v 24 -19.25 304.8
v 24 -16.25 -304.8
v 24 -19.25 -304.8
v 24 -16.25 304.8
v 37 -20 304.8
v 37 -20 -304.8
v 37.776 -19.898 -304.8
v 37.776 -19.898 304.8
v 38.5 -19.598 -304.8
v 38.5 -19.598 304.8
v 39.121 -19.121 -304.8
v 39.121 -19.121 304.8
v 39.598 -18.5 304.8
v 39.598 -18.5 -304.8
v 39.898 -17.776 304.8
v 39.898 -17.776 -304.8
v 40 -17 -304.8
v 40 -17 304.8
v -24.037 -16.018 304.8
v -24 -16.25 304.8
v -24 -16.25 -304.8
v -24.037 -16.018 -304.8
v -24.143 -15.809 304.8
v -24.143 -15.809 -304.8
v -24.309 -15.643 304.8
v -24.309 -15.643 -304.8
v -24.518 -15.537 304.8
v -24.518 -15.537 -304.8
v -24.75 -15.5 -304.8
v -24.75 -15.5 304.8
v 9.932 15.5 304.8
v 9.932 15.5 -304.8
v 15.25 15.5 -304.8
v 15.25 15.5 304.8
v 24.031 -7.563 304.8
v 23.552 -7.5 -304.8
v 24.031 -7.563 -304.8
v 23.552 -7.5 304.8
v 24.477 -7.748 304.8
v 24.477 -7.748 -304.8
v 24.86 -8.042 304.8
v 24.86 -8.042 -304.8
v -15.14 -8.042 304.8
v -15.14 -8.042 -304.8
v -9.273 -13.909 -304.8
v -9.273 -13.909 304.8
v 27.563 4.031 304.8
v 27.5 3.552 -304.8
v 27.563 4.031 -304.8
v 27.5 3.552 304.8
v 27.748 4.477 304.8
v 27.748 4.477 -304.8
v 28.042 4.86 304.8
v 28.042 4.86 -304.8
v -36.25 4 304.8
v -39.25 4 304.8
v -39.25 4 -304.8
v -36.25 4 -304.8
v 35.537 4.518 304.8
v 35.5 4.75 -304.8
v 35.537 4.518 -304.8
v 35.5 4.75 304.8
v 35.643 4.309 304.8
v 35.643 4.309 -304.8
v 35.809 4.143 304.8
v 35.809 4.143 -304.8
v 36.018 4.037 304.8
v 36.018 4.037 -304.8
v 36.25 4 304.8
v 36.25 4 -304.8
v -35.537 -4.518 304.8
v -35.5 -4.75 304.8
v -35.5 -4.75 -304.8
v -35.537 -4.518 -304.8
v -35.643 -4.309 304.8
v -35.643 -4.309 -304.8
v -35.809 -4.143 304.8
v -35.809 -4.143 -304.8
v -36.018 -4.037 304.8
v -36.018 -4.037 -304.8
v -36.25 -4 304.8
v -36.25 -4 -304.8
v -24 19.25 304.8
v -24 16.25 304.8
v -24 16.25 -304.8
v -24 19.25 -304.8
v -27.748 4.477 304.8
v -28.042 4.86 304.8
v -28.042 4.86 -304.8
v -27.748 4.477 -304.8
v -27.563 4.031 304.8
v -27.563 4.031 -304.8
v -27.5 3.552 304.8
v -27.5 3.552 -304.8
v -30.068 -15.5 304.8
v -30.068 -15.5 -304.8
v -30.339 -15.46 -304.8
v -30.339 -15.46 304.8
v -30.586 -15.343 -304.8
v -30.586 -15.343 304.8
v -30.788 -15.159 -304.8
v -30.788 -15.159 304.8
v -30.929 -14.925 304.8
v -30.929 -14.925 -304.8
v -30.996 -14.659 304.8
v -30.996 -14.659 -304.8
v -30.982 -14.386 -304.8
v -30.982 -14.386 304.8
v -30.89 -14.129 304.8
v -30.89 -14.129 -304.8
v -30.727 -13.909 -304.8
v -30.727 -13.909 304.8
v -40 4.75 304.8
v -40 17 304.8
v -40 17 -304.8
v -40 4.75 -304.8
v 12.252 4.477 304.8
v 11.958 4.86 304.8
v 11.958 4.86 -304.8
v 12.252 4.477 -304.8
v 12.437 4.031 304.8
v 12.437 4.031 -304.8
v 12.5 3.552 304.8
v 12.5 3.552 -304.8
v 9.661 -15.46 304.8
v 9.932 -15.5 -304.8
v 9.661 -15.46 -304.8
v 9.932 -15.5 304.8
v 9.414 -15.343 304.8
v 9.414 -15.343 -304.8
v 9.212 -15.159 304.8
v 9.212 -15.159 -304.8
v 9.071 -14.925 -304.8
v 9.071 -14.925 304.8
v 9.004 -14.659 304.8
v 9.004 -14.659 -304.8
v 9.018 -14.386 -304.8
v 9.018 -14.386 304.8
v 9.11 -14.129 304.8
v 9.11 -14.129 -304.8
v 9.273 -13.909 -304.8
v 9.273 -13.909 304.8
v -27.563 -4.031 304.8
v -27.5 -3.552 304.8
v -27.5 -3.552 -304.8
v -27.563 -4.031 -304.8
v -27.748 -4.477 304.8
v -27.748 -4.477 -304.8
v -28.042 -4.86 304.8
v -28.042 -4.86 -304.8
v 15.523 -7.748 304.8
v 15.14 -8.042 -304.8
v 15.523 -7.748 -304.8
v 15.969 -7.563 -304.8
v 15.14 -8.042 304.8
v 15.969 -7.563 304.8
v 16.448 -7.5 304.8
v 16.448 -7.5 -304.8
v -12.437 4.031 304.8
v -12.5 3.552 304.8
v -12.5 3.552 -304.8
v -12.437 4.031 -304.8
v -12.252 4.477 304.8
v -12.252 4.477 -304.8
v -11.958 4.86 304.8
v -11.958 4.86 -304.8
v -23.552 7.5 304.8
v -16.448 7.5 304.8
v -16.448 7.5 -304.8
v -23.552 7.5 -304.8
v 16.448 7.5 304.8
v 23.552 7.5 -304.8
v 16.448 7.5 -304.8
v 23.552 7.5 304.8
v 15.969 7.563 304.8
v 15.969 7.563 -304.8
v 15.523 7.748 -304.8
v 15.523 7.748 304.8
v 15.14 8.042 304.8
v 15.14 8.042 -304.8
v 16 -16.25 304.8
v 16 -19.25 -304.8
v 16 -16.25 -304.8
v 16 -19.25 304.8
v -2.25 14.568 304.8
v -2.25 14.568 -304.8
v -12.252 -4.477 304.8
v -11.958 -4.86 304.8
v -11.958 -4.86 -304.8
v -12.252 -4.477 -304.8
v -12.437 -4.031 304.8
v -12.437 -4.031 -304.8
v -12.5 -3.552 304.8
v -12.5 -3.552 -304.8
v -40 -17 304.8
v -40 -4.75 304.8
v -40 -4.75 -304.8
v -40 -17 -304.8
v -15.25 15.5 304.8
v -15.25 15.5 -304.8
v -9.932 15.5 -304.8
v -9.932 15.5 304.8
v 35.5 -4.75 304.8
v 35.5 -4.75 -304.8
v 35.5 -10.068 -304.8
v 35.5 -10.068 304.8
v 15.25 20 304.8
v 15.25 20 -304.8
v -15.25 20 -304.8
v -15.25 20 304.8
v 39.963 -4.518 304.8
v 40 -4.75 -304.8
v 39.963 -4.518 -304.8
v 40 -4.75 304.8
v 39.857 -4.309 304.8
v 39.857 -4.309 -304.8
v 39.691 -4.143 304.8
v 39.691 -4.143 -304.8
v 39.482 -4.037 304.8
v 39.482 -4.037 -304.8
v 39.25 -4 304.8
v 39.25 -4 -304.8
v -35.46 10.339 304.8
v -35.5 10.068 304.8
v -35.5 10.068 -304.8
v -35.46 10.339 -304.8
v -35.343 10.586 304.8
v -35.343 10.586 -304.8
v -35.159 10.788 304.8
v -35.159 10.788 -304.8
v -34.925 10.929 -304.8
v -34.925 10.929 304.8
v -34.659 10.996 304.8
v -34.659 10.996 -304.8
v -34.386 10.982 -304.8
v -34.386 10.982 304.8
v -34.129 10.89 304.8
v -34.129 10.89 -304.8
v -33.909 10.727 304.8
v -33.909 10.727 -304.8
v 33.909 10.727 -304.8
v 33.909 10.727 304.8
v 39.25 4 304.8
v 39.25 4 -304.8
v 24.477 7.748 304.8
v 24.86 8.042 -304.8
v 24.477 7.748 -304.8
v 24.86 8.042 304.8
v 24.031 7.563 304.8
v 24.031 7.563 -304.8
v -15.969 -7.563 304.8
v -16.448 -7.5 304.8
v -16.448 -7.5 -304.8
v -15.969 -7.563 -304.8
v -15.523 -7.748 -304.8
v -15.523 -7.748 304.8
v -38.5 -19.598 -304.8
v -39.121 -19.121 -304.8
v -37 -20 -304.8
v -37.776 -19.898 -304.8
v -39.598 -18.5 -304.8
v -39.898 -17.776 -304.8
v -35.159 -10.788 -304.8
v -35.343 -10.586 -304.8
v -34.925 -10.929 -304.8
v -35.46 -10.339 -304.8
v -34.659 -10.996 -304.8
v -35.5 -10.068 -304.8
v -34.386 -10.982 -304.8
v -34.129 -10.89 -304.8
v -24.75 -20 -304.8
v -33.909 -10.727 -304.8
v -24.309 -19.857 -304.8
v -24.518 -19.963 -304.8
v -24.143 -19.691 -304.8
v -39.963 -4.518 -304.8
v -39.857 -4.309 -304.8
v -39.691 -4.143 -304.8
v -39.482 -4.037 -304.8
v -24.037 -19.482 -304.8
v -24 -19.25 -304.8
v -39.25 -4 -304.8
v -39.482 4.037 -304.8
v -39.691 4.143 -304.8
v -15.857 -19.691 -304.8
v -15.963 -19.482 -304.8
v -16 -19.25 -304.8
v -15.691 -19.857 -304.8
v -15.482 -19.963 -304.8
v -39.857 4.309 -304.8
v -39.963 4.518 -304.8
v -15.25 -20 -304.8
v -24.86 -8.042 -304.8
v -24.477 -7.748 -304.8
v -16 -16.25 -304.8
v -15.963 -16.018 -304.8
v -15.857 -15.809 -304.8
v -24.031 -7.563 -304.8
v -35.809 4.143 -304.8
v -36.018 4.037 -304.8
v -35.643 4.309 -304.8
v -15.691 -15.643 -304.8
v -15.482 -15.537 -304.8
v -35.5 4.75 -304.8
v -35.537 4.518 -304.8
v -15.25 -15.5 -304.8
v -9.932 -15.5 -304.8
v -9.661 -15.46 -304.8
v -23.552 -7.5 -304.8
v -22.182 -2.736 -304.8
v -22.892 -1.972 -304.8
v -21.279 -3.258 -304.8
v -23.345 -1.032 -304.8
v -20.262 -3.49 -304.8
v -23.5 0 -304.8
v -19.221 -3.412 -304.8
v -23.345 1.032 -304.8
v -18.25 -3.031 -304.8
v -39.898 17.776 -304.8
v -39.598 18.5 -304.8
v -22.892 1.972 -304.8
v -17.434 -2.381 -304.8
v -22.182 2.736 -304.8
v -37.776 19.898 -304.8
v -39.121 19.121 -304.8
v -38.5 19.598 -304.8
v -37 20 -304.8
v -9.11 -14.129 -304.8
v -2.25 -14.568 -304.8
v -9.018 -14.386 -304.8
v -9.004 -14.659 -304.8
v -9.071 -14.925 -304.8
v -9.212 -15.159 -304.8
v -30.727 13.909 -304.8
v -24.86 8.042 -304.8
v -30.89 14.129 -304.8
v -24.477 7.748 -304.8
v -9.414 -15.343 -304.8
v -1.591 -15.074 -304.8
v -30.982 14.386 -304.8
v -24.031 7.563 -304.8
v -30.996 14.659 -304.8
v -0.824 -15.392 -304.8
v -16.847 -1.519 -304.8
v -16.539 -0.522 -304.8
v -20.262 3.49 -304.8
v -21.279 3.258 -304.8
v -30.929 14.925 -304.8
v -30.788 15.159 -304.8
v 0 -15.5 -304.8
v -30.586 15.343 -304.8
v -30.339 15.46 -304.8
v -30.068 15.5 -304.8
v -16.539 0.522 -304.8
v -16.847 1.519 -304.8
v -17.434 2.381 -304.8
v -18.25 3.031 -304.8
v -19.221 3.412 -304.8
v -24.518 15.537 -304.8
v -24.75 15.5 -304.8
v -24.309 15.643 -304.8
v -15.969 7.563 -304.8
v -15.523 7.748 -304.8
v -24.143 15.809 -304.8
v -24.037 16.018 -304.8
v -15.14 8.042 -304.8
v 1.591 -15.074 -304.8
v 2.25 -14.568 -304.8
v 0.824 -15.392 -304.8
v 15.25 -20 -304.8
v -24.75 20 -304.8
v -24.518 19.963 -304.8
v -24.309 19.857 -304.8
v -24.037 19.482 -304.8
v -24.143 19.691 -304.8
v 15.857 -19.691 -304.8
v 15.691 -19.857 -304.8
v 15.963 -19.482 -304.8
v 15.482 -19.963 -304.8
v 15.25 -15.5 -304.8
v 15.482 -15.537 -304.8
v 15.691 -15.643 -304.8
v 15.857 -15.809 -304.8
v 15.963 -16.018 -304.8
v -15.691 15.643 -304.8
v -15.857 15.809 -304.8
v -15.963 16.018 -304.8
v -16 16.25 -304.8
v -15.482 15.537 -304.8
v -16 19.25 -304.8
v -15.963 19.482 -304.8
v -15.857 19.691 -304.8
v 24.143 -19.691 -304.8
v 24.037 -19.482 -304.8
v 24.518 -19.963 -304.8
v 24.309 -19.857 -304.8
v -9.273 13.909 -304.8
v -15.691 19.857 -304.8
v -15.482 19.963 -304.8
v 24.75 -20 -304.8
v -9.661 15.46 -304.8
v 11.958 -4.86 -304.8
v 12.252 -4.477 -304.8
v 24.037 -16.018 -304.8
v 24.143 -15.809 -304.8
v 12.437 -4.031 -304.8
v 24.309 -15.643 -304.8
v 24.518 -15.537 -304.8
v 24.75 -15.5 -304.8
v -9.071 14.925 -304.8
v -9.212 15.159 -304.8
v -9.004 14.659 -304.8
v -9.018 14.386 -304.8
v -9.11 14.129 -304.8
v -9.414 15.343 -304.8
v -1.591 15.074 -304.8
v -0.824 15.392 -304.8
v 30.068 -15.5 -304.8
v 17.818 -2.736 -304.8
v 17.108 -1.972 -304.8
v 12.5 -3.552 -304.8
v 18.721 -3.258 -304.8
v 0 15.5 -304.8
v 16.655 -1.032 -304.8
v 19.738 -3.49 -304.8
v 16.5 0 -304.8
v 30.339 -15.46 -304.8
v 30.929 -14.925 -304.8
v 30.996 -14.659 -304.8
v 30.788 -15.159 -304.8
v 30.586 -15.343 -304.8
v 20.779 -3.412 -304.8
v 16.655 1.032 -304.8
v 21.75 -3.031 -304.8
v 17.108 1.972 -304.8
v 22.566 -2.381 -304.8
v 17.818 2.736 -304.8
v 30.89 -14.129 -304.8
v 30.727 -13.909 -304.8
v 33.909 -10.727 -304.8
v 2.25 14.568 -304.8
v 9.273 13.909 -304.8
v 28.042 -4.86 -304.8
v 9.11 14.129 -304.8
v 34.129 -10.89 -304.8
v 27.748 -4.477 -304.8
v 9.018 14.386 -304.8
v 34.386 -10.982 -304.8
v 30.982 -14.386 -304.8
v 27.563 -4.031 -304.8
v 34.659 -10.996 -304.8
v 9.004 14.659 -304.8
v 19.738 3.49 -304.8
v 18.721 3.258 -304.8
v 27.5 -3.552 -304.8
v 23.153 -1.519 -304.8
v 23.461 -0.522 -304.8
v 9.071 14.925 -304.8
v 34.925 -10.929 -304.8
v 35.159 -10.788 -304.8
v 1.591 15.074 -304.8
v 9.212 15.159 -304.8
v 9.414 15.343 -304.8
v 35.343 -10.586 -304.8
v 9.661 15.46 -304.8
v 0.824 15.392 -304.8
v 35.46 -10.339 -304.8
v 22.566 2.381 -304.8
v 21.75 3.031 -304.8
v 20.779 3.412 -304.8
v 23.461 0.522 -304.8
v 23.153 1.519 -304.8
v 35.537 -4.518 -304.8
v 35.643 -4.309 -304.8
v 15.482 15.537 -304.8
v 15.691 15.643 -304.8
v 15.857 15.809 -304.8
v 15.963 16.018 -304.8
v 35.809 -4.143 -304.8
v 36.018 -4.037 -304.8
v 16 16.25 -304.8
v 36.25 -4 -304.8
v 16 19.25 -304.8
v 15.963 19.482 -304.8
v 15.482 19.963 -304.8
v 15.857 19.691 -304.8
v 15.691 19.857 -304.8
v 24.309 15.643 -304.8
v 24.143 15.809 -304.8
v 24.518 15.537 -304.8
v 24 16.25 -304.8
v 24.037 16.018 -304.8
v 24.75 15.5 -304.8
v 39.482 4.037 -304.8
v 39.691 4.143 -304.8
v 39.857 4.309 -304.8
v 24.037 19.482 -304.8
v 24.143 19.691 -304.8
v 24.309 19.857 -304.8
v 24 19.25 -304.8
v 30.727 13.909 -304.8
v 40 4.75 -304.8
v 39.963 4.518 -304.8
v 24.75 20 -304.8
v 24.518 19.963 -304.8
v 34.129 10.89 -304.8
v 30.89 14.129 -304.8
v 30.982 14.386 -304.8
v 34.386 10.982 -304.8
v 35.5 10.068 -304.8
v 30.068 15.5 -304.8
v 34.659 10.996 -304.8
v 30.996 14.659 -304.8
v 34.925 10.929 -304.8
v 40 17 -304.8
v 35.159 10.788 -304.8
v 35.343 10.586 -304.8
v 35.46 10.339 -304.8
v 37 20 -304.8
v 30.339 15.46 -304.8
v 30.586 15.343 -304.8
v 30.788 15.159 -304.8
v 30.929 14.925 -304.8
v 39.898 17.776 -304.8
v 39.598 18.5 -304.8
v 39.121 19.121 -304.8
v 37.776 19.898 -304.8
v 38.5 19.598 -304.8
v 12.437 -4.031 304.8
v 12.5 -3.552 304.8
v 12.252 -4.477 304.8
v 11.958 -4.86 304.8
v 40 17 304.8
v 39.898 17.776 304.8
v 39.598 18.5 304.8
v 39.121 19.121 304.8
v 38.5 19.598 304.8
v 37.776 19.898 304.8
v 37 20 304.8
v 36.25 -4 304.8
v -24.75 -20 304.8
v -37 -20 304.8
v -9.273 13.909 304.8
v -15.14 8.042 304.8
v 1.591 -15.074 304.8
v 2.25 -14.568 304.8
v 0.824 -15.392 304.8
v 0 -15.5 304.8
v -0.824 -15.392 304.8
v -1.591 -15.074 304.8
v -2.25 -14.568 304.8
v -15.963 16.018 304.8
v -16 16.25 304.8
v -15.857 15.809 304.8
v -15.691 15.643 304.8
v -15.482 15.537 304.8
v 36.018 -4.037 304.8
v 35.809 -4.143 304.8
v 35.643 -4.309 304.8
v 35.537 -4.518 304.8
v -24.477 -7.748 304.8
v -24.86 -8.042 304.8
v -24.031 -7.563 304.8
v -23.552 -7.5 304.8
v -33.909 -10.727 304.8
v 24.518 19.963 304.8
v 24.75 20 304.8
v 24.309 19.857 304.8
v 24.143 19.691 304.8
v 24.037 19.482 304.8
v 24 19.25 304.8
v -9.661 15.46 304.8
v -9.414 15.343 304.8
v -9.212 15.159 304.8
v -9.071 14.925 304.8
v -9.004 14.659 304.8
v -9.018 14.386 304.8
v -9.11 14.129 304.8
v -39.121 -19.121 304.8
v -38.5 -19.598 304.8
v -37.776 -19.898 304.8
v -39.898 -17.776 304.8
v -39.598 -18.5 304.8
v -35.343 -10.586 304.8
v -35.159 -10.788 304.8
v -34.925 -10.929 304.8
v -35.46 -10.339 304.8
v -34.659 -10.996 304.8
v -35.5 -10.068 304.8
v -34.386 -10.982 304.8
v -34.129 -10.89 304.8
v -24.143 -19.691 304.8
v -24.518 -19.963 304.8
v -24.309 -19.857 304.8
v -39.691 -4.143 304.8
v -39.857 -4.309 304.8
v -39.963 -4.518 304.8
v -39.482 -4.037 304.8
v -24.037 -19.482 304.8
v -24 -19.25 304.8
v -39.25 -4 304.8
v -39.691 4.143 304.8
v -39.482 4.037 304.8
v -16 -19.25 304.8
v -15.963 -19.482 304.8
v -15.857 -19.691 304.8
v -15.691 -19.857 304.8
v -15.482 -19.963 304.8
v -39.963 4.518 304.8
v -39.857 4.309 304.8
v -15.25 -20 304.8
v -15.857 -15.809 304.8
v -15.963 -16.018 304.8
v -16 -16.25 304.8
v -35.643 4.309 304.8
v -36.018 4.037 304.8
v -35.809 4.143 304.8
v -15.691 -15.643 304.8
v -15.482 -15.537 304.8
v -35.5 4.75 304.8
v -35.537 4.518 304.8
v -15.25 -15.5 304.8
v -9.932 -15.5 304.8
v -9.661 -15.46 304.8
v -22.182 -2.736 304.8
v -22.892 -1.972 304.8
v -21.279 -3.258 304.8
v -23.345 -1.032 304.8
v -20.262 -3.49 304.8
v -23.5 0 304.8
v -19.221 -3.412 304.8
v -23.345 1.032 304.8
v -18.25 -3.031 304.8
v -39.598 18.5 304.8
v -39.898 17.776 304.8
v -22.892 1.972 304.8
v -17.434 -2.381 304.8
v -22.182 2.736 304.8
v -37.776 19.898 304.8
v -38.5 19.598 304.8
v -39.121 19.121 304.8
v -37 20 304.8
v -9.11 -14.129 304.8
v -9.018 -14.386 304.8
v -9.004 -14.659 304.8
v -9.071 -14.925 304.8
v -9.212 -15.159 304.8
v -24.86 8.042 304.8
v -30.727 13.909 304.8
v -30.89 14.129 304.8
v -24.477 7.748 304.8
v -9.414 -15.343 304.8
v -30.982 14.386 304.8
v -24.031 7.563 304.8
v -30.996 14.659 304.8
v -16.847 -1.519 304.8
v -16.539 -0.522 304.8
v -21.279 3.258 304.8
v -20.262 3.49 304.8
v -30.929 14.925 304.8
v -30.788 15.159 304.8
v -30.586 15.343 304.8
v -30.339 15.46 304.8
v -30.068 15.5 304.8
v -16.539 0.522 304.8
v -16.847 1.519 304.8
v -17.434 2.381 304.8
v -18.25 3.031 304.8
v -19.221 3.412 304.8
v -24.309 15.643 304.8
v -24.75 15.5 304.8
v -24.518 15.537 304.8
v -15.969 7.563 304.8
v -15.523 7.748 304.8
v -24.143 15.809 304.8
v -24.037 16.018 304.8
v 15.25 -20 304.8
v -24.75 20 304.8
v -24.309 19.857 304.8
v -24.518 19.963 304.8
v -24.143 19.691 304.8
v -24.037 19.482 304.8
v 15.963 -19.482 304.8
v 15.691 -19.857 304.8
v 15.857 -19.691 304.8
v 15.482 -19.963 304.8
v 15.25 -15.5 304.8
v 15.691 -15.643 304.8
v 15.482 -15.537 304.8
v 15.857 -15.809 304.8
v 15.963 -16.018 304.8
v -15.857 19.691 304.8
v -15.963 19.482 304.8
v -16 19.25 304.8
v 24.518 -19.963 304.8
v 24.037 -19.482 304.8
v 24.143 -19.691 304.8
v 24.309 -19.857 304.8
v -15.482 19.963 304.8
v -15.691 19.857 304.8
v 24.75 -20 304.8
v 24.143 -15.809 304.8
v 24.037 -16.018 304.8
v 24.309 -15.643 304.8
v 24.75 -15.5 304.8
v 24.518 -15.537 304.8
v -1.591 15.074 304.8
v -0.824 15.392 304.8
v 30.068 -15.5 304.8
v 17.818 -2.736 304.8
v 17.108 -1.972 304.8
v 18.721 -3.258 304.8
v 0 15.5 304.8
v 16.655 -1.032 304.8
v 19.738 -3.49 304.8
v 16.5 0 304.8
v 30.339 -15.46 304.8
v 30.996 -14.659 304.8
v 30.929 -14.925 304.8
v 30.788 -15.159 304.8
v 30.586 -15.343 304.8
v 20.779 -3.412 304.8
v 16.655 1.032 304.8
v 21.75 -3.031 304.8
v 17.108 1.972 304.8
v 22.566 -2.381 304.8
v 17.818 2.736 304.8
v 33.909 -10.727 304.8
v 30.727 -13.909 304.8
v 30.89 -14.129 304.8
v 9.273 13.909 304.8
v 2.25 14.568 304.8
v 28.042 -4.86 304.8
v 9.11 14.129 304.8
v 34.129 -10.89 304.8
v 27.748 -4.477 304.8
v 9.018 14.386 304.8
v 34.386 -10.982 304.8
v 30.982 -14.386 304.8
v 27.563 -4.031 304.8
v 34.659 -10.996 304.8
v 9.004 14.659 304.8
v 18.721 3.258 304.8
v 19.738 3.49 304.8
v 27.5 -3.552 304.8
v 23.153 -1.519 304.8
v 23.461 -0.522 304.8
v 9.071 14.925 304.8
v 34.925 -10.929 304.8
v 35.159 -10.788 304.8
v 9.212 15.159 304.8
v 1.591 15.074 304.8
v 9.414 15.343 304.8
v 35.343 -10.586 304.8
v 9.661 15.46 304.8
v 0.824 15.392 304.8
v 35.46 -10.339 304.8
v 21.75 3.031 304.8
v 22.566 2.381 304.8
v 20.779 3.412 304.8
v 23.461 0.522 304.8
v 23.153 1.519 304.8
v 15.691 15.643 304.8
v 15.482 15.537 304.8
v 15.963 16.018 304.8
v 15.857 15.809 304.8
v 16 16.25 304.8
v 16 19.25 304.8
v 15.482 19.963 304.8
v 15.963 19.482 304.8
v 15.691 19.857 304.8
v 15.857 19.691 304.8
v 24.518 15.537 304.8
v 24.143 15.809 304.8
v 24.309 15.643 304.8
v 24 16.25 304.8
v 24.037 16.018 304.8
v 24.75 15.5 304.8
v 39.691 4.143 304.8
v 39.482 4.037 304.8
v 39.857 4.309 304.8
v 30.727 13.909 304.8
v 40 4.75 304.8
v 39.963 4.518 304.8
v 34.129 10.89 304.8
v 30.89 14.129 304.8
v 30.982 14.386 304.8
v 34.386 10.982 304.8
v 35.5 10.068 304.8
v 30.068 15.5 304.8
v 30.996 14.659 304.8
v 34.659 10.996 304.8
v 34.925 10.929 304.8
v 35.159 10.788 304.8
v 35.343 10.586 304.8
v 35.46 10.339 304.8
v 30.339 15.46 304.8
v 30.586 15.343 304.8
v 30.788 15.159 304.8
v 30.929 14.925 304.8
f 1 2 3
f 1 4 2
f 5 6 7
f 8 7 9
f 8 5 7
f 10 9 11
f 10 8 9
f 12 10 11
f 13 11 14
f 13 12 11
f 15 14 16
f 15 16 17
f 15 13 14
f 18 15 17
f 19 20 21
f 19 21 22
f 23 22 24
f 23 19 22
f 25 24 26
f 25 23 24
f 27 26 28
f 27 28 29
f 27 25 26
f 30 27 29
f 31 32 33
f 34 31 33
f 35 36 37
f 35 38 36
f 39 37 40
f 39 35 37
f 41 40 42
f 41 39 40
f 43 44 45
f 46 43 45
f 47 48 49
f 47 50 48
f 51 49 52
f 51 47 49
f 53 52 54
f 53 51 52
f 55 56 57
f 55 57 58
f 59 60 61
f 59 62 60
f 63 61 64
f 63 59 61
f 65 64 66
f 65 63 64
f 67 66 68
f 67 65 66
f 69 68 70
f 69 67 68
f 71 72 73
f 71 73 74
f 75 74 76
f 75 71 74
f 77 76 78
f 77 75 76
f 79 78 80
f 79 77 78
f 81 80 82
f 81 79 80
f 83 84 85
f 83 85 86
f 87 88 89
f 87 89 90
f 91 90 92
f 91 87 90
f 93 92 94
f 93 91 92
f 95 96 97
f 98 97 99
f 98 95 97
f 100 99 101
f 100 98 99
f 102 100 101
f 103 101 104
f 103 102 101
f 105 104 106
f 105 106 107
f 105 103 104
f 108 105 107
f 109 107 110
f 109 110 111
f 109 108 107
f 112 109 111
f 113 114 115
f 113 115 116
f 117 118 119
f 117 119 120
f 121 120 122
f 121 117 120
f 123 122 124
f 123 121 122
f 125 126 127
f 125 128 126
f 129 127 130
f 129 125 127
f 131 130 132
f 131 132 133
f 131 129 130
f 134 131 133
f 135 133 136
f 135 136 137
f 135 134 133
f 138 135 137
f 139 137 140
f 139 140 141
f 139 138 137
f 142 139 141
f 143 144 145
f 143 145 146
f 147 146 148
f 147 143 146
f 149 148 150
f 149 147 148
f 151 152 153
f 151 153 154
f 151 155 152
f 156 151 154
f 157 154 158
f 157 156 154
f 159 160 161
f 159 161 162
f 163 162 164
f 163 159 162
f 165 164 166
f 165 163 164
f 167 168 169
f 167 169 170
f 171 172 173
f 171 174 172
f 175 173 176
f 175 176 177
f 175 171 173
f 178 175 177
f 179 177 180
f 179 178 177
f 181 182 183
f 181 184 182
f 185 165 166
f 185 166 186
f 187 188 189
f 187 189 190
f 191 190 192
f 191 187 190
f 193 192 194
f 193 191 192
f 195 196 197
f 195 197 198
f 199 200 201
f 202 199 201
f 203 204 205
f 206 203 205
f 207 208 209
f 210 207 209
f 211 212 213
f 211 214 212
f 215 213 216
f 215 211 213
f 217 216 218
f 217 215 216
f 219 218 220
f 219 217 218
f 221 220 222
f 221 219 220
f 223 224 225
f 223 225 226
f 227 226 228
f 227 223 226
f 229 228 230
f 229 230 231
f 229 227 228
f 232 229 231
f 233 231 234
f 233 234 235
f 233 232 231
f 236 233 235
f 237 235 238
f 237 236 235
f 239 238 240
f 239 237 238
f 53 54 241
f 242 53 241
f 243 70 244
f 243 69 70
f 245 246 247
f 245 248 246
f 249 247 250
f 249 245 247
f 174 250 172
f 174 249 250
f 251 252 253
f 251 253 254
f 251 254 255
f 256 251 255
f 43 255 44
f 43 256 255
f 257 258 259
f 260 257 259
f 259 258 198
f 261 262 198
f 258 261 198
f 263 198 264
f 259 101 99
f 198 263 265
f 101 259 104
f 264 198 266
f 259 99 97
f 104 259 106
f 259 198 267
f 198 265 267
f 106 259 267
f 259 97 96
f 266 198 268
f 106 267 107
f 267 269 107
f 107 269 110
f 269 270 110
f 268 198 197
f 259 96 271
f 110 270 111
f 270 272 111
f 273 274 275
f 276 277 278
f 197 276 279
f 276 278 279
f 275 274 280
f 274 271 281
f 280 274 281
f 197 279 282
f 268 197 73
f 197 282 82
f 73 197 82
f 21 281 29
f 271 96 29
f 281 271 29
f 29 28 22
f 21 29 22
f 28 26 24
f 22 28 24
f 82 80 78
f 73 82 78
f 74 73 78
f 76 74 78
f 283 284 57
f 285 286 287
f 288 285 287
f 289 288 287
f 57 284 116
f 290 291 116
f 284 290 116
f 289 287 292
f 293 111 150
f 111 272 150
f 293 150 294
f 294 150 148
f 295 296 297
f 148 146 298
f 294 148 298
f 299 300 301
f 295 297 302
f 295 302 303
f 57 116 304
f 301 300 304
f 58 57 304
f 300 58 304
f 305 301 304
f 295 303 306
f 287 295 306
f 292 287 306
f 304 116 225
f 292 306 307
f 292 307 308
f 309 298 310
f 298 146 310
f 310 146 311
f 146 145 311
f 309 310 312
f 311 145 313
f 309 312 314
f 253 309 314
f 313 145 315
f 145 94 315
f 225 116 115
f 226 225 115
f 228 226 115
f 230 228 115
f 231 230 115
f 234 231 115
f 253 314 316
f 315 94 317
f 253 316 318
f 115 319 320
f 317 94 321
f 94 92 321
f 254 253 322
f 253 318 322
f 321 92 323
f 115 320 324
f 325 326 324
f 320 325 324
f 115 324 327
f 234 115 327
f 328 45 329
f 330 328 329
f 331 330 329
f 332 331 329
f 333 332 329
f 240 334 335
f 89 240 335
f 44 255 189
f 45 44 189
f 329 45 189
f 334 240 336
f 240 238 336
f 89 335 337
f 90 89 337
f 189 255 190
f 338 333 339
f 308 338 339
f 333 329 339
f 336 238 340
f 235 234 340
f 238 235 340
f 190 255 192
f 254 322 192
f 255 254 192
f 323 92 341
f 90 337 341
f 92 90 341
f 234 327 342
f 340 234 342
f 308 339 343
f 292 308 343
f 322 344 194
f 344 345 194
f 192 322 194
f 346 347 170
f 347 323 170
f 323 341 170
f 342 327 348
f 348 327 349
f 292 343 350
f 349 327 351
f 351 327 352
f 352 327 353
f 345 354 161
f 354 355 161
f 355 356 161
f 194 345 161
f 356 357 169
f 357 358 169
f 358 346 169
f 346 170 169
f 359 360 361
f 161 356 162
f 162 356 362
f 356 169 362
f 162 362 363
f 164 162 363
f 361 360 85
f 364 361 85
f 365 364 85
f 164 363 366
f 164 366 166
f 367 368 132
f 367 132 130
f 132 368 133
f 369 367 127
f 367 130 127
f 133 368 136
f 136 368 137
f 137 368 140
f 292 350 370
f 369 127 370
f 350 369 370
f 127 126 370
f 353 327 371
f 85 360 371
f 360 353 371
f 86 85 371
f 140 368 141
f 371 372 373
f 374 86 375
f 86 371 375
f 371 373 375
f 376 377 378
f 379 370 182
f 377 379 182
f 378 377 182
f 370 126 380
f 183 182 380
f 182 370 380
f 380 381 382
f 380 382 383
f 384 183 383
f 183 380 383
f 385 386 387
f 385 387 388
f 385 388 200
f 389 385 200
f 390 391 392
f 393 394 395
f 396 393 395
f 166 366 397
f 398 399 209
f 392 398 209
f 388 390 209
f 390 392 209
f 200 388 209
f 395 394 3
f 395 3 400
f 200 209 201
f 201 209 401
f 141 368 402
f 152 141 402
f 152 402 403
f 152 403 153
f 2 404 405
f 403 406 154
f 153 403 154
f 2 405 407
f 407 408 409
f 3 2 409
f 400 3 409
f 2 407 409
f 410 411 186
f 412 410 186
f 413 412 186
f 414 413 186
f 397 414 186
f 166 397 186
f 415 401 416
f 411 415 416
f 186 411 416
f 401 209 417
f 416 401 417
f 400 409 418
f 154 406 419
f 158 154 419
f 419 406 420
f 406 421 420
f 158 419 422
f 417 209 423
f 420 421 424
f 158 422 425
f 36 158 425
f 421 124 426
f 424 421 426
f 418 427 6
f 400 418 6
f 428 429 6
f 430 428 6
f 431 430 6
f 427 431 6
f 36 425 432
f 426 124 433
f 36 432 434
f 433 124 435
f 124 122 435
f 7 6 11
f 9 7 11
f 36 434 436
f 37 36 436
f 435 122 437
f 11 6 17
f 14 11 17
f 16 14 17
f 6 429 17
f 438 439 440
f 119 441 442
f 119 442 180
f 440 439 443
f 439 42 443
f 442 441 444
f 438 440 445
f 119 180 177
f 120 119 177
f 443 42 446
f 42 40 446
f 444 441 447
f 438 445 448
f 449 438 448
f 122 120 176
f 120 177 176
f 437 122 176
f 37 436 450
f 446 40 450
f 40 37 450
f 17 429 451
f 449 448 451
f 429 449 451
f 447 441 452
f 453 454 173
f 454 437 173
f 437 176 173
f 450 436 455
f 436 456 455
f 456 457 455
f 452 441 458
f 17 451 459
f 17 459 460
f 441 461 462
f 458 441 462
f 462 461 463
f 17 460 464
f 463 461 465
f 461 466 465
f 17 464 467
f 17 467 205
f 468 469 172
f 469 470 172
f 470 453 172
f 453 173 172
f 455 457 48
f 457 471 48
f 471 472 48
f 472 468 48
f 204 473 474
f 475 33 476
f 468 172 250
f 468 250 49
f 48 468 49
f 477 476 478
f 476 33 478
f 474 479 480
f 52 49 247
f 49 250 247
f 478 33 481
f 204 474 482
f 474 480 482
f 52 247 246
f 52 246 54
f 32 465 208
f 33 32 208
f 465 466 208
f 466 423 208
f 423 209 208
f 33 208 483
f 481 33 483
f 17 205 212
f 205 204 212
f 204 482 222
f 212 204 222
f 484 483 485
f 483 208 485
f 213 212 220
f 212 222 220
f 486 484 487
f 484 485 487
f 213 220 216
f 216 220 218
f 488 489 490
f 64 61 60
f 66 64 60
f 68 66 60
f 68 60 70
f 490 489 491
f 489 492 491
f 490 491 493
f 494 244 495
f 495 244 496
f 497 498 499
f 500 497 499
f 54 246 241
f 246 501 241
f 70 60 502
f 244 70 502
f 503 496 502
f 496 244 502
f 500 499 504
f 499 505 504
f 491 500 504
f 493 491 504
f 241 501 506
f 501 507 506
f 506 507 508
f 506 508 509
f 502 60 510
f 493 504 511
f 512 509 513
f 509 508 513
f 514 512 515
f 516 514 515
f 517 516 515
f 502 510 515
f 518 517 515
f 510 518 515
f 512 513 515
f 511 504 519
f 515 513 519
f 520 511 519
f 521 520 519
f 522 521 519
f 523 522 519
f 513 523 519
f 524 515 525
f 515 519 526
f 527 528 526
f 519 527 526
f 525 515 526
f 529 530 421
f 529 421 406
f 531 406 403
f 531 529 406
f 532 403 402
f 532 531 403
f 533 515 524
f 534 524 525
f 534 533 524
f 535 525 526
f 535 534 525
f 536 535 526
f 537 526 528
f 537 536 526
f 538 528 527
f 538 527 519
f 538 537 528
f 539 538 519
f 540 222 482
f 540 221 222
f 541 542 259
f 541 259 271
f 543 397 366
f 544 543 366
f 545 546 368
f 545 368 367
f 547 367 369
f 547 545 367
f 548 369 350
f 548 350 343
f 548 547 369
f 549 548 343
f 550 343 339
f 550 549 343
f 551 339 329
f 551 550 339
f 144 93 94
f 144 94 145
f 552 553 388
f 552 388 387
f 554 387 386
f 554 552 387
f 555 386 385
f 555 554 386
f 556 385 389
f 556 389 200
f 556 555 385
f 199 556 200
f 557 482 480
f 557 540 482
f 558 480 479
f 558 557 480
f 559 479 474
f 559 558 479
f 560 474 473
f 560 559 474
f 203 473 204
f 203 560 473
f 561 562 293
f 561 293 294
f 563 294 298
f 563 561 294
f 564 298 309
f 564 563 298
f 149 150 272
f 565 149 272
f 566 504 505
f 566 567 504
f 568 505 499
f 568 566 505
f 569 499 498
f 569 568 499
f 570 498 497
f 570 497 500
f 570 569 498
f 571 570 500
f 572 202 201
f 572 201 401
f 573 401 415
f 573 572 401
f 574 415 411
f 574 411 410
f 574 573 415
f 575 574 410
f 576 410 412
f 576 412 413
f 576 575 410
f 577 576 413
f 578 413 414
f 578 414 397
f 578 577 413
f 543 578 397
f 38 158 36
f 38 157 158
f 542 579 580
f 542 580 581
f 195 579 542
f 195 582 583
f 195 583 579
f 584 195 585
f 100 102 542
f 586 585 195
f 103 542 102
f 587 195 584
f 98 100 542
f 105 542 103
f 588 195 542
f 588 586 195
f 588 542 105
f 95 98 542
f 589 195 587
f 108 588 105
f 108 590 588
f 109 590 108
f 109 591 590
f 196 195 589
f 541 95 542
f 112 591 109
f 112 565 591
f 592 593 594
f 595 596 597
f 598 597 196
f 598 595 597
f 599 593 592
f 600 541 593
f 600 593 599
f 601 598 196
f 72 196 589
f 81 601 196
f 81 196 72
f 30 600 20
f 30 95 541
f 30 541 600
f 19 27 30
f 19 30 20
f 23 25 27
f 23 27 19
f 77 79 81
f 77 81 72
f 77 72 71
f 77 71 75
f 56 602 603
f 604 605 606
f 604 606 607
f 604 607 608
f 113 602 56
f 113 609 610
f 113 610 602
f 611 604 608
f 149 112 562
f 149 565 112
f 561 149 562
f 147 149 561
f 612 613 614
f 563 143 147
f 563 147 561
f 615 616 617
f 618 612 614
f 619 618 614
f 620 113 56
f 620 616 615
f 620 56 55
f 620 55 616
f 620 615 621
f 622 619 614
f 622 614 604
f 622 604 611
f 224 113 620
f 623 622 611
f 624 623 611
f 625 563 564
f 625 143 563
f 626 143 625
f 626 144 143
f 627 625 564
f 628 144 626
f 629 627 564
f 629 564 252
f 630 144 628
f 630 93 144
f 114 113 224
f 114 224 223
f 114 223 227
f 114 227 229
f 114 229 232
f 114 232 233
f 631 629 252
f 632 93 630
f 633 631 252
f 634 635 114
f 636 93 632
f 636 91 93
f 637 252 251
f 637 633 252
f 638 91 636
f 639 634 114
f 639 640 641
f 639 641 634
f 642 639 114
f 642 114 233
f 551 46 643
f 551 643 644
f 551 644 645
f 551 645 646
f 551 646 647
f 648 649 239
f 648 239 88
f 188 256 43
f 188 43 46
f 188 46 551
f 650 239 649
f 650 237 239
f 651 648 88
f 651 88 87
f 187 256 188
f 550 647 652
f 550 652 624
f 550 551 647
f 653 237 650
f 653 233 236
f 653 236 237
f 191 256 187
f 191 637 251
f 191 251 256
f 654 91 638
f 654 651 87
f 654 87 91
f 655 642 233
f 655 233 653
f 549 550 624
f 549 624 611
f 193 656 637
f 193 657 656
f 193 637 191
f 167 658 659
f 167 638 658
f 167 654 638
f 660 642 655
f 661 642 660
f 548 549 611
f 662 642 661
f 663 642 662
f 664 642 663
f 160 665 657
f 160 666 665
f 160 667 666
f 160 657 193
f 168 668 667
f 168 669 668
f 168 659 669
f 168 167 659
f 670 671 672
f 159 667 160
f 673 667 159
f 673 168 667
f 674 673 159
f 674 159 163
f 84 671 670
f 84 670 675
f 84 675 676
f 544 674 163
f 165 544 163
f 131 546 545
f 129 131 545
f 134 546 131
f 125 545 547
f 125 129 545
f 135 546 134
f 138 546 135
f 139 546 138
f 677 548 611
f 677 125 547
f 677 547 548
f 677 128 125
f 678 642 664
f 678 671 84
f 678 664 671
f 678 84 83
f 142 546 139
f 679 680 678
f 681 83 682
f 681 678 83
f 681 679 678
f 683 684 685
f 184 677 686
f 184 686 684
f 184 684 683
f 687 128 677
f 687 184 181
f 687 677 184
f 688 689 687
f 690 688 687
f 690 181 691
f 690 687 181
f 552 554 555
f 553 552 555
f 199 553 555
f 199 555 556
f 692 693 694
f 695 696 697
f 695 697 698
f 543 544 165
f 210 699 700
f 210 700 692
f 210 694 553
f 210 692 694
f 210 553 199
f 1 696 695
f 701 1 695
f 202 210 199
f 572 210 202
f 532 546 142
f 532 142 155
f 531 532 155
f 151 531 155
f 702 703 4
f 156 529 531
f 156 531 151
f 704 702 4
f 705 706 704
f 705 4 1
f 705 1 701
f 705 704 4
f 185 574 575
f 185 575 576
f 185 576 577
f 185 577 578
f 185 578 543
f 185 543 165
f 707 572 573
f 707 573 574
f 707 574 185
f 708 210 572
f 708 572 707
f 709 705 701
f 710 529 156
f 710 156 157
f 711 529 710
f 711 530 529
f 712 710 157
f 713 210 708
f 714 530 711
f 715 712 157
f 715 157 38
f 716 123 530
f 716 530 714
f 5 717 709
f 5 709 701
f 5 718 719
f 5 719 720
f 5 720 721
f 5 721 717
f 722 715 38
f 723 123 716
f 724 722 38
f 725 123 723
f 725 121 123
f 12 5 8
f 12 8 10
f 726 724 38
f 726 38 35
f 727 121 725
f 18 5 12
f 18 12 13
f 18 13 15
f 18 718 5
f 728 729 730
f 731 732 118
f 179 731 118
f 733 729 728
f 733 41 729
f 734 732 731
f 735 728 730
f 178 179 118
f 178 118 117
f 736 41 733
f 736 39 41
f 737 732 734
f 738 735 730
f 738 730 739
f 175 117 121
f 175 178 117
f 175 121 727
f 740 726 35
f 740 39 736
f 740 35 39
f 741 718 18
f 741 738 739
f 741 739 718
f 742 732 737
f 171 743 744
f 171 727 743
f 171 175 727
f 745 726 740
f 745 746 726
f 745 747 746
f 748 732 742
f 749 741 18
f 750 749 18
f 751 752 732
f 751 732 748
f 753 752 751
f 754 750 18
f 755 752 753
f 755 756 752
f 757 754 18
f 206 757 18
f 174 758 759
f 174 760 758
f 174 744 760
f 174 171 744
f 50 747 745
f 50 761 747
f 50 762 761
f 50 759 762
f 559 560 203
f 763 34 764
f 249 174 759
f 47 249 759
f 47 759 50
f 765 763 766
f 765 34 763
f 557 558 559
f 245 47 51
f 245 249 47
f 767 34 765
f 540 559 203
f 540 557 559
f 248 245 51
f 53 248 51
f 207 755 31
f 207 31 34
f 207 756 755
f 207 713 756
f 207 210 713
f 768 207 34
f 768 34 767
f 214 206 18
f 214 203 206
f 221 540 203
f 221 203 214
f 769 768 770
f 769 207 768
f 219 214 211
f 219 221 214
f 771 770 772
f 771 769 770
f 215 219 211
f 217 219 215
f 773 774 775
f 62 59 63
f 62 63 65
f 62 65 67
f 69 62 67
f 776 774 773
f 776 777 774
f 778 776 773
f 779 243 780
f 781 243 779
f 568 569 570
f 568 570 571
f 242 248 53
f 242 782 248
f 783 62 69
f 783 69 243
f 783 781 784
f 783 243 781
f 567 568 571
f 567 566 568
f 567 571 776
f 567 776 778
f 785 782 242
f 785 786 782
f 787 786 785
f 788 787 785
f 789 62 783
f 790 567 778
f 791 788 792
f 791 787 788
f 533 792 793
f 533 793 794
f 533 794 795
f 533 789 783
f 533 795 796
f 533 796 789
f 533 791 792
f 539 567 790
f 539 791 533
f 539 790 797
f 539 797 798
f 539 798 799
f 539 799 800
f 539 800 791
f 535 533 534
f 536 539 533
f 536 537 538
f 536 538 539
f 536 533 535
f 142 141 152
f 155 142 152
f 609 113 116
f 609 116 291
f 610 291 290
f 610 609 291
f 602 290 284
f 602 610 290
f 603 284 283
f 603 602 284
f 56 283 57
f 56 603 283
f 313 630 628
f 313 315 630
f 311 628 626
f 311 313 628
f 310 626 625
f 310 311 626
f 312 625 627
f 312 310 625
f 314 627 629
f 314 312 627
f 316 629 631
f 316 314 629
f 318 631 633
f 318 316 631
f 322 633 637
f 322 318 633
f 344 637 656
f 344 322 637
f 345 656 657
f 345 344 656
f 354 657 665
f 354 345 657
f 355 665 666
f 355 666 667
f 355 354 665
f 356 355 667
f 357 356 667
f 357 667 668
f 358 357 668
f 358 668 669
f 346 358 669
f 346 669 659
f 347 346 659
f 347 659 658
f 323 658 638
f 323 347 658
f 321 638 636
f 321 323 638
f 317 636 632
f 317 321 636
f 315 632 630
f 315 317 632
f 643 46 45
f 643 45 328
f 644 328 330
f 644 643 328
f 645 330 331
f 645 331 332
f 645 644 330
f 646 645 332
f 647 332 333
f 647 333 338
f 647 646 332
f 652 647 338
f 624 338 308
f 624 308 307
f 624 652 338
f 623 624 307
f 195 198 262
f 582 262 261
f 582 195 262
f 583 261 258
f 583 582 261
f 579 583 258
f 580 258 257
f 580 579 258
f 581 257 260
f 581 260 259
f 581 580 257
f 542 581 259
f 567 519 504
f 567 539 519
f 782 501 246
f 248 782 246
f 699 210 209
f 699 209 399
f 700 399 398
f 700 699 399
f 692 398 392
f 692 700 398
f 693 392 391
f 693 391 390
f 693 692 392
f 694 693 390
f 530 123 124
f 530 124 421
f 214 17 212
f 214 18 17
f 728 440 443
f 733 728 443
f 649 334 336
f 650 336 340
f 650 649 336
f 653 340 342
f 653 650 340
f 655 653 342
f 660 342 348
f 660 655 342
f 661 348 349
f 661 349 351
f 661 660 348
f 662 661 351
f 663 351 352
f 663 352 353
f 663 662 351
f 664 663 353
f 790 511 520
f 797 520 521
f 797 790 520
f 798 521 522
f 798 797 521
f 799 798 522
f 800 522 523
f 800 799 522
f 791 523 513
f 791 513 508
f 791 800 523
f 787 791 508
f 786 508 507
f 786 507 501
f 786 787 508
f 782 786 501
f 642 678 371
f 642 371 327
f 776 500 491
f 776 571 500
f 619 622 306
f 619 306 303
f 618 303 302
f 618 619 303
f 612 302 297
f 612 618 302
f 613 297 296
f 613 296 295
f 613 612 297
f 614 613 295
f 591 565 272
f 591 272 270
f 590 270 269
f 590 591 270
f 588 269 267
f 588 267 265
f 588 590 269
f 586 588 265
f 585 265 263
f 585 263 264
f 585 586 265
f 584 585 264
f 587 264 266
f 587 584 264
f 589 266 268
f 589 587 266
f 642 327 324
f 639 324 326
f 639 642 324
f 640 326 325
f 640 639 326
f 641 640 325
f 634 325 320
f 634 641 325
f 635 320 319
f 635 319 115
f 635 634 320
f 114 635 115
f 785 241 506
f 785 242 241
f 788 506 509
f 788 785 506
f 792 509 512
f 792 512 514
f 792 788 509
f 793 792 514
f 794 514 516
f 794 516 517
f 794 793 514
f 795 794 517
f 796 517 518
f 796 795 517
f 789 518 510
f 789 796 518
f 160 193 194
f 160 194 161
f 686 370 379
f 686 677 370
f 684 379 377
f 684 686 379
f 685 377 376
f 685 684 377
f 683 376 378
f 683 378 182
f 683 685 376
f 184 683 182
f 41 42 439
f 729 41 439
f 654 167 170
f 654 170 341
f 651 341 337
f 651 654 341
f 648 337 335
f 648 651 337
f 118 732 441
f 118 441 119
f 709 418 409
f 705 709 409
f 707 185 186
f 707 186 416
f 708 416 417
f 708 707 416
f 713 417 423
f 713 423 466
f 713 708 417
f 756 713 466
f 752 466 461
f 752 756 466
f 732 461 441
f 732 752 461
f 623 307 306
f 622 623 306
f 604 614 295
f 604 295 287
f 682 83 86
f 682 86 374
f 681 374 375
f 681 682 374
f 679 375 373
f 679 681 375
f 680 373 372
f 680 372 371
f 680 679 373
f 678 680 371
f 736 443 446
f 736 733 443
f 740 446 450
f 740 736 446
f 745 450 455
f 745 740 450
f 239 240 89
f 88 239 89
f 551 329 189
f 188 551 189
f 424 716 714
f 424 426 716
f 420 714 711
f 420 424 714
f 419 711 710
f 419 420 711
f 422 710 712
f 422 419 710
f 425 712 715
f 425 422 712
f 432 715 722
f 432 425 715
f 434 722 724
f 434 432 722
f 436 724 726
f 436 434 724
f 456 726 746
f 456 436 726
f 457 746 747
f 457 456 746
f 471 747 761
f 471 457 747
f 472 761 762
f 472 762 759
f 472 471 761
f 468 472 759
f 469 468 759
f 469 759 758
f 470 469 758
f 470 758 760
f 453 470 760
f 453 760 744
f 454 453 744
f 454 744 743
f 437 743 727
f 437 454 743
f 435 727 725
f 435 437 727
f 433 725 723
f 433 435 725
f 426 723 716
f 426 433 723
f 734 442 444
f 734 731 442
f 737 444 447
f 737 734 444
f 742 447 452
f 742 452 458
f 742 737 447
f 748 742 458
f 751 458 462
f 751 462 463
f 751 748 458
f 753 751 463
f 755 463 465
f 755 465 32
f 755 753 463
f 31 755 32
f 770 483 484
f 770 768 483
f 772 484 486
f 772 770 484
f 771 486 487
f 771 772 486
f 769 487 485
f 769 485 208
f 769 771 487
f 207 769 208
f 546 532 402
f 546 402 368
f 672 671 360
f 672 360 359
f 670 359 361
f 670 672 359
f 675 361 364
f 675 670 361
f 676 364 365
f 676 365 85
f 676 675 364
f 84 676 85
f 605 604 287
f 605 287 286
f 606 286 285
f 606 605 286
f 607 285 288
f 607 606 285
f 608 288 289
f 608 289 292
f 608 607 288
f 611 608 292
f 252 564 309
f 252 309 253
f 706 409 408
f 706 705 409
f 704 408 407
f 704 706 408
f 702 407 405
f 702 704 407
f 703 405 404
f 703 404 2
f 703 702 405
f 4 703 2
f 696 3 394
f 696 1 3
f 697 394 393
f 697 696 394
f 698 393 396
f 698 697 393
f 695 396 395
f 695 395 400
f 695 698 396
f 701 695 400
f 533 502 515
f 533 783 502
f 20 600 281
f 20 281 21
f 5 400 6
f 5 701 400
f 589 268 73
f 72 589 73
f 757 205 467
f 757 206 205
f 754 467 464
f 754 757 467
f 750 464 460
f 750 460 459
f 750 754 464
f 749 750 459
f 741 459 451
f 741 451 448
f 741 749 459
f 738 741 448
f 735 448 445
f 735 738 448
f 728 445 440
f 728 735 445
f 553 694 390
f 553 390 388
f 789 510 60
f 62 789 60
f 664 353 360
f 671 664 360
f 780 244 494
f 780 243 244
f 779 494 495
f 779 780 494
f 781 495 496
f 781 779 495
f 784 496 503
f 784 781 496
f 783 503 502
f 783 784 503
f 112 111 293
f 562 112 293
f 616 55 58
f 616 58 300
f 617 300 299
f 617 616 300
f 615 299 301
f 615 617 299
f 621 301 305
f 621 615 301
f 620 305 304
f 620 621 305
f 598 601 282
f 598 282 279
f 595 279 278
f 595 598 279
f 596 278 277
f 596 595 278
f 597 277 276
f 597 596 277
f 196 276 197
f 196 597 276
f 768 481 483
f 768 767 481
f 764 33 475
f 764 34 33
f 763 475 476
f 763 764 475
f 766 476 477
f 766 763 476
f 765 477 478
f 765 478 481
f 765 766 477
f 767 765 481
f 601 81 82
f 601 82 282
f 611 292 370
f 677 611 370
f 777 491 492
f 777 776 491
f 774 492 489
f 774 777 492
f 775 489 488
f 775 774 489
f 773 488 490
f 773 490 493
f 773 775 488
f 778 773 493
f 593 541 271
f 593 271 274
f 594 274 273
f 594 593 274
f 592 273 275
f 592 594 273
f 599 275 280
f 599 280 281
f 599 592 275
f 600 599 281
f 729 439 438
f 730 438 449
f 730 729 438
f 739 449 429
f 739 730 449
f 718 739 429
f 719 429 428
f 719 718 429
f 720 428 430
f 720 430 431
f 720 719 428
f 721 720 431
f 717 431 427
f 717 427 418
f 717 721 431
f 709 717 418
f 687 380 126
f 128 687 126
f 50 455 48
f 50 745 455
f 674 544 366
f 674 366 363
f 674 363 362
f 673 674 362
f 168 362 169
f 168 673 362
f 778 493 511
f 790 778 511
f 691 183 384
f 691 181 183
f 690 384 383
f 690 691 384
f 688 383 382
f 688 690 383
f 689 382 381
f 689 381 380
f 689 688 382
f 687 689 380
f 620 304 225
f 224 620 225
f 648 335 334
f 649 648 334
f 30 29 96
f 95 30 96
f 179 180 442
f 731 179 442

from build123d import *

# Parameters (mm, degrees)
SKETCH3_R           = 3.5
BOSS_EXTRUDE1_DEPTH = 304.8


with BuildPart() as part:
    # Sketch3 → Boss-Extrude1 (new, symmetric)
    with BuildSketch(Plane.XY):
        with BuildLine():
            Line((15.25, 20), (-15.25, 20))
            ThreePointArc((-15.25, 20), (-15.780330086, 19.780330086), (-16, 19.25))
            Line((-16, 19.25), (-16, 16.25))
            ThreePointArc((-16, 16.25), (-15.780330086, 15.719669914), (-15.25, 15.5))
            Line((-15.25, 15.5), (-9.931980515, 15.5))
            ThreePointArc((-9.931980515, 15.5), (-9.070942793, 14.924672987), (-9.272970773, 13.909009742))
            Line((-9.272970773, 13.909009742), (-15.140128061, 8.041852455))
            ThreePointArc((-15.140128061, 8.041852455), (-15.740311256, 7.640822865), (-16.448275606, 7.5))
            Line((-16.448275606, 7.5), (-23.551724394, 7.5))
            ThreePointArc((-23.551724394, 7.5), (-24.259688744, 7.640822865), (-24.859871939, 8.041852455))
            Line((-24.859871939, 8.041852455), (-30.727029227, 13.909009742))
            ThreePointArc((-30.727029227, 13.909009742), (-30.929057207, 14.924672987), (-30.068019485, 15.5))
            Line((-30.068019485, 15.5), (-24.75, 15.5))
            ThreePointArc((-24.75, 15.5), (-24.219669914, 15.719669914), (-24, 16.25))
            Line((-24, 16.25), (-24, 19.25))
            ThreePointArc((-24, 19.25), (-24.219669914, 19.780330086), (-24.75, 20))
            Line((-24.75, 20), (-37, 20))
            ThreePointArc((-37, 20), (-39.121320344, 19.121320344), (-40, 17))
            Line((-40, 17), (-40, 4.75))
            ThreePointArc((-40, 4.75), (-39.780330086, 4.219669914), (-39.25, 4))
            Line((-39.25, 4), (-36.25, 4))
            ThreePointArc((-36.25, 4), (-35.719669914, 4.219669914), (-35.5, 4.75))
            Line((-35.5, 4.75), (-35.5, 10.068019485))
            ThreePointArc((-35.5, 10.068019485), (-34.924672987, 10.929057207), (-33.909009742, 10.727029227))
            Line((-33.909009742, 10.727029227), (-28.041852455, 4.859871939))
            ThreePointArc((-28.041852455, 4.859871939), (-27.640822865, 4.259688744), (-27.5, 3.551724394))
            Line((-27.5, 3.551724394), (-27.5, -3.551724394))
            ThreePointArc((-27.5, -3.551724394), (-27.640822865, -4.259688744), (-28.041852455, -4.859871939))
            Line((-28.041852455, -4.859871939), (-33.909009742, -10.727029227))
            ThreePointArc((-33.909009742, -10.727029227), (-34.924672987, -10.929057207), (-35.5, -10.068019485))
            Line((-35.5, -10.068019485), (-35.5, -4.75))
            ThreePointArc((-35.5, -4.75), (-35.719669914, -4.219669914), (-36.25, -4))
            Line((-36.25, -4), (-39.25, -4))
            ThreePointArc((-39.25, -4), (-39.780330086, -4.219669914), (-40, -4.75))
            Line((-40, -4.75), (-40, -17))
            ThreePointArc((-40, -17), (-39.121320344, -19.121320344), (-37, -20))
            Line((-37, -20), (-24.75, -20))
            ThreePointArc((-24.75, -20), (-24.219669914, -19.780330086), (-24, -19.25))
            Line((-24, -19.25), (-24, -16.25))
            ThreePointArc((-24, -16.25), (-24.219669914, -15.719669914), (-24.75, -15.5))
            Line((-24.75, -15.5), (-30.068019485, -15.5))
            ThreePointArc((-30.068019485, -15.5), (-30.929057207, -14.924672987), (-30.727029227, -13.909009742))
            Line((-30.727029227, -13.909009742), (-24.859871939, -8.041852455))
            ThreePointArc((-24.859871939, -8.041852455), (-24.259688744, -7.640822865), (-23.551724394, -7.5))
            Line((-23.551724394, -7.5), (-16.448275606, -7.5))
            ThreePointArc((-16.448275606, -7.5), (-15.740311256, -7.640822865), (-15.140128061, -8.041852455))
            Line((-15.140128061, -8.041852455), (-9.272970773, -13.909009742))
            ThreePointArc((-9.272970773, -13.909009742), (-9.070942793, -14.924672987), (-9.931980515, -15.5))
            Line((-9.931980515, -15.5), (-15.25, -15.5))
            ThreePointArc((-15.25, -15.5), (-15.780330086, -15.719669914), (-16, -16.25))
            Line((-16, -16.25), (-16, -19.25))
            ThreePointArc((-16, -19.25), (-15.780330086, -19.780330086), (-15.25, -20))
            Line((-15.25, -20), (15.25, -20))
            ThreePointArc((15.25, -20), (15.780330086, -19.780330086), (16, -19.25))
            Line((16, -19.25), (16, -16.25))
            ThreePointArc((16, -16.25), (15.780330086, -15.719669914), (15.25, -15.5))
            Line((15.25, -15.5), (9.931980515, -15.5))
            ThreePointArc((9.931980515, -15.5), (9.070942793, -14.924672987), (9.272970773, -13.909009742))
            Line((9.272970773, -13.909009742), (15.140128061, -8.041852455))
            ThreePointArc((15.140128061, -8.041852455), (15.740311256, -7.640822865), (16.448275606, -7.5))
            Line((16.448275606, -7.5), (23.551724394, -7.5))
            ThreePointArc((23.551724394, -7.5), (24.259688744, -7.640822865), (24.859871939, -8.041852455))
            Line((24.859871939, -8.041852455), (30.727029227, -13.909009742))
            ThreePointArc((30.727029227, -13.909009742), (30.929057207, -14.924672987), (30.068019485, -15.5))
            Line((30.068019485, -15.5), (24.75, -15.5))
            ThreePointArc((24.75, -15.5), (24.219669914, -15.719669914), (24, -16.25))
            Line((24, -16.25), (24, -19.25))
            ThreePointArc((24, -19.25), (24.219669914, -19.780330086), (24.75, -20))
            Line((24.75, -20), (37, -20))
            ThreePointArc((37, -20), (39.121320344, -19.121320344), (40, -17))
            Line((40, -17), (40, -4.75))
            ThreePointArc((40, -4.75), (39.780330086, -4.219669914), (39.25, -4))
            Line((39.25, -4), (36.25, -4))
            ThreePointArc((36.25, -4), (35.719669914, -4.219669914), (35.5, -4.75))
            Line((35.5, -4.75), (35.5, -10.068019485))
            ThreePointArc((35.5, -10.068019485), (34.924672987, -10.929057207), (33.909009742, -10.727029227))
            Line((33.909009742, -10.727029227), (28.041852455, -4.859871939))
            ThreePointArc((28.041852455, -4.859871939), (27.640822865, -4.259688744), (27.5, -3.551724394))
            Line((27.5, -3.551724394), (27.5, 3.551724394))
            ThreePointArc((27.5, 3.551724394), (27.640822865, 4.259688744), (28.041852455, 4.859871939))
            Line((28.041852455, 4.859871939), (33.909009742, 10.727029227))
            ThreePointArc((33.909009742, 10.727029227), (34.924672987, 10.929057207), (35.5, 10.068019485))
            Line((35.5, 10.068019485), (35.5, 4.75))
            ThreePointArc((35.5, 4.75), (35.719669914, 4.219669914), (36.25, 4))
            Line((36.25, 4), (39.25, 4))
            ThreePointArc((39.25, 4), (39.780330086, 4.219669914), (40, 4.75))
            Line((40, 4.75), (40, 17))
            ThreePointArc((40, 17), (39.121320344, 19.121320344), (37, 20))
            Line((37, 20), (24.75, 20))
            ThreePointArc((24.75, 20), (24.219669914, 19.780330086), (24, 19.25))
            Line((24, 19.25), (24, 16.25))
            ThreePointArc((24, 16.25), (24.219669914, 15.719669914), (24.75, 15.5))
            Line((24.75, 15.5), (30.068019485, 15.5))
            ThreePointArc((30.068019485, 15.5), (30.929057207, 14.924672987), (30.727029227, 13.909009742))
            Line((30.727029227, 13.909009742), (24.859871939, 8.041852455))
            ThreePointArc((24.859871939, 8.041852455), (24.259688744, 7.640822865), (23.551724394, 7.5))
            Line((23.551724394, 7.5), (16.448275606, 7.5))
            ThreePointArc((16.448275606, 7.5), (15.740311256, 7.640822865), (15.140128061, 8.041852455))
            Line((15.140128061, 8.041852455), (9.272970773, 13.909009742))
            ThreePointArc((9.272970773, 13.909009742), (9.070942793, 14.924672987), (9.931980515, 15.5))
            Line((9.931980515, 15.5), (15.25, 15.5))
            ThreePointArc((15.25, 15.5), (15.780330086, 15.719669914), (16, 16.25))
            Line((16, 16.25), (16, 19.25))
            ThreePointArc((16, 19.25), (15.780330086, 19.780330086), (15.25, 20))
        make_face()
        with Locations(Location((-20, 0, 0), (0, 0, 180))):
            Circle(SKETCH3_R, mode=Mode.SUBTRACT)
        with Locations(Location((20, 0, 0), (0, 0, 180))):
            Circle(SKETCH3_R, mode=Mode.SUBTRACT)
        with BuildLine():
            Line((-2.25, -14.568019485), (-11.958147545, -4.859871939))
            ThreePointArc((-11.958147545, -4.859871939), (-12.359177135, -4.259688744), (-12.5, -3.551724394))
            Line((-12.5, -3.551724394), (-12.5, 3.551724394))
            ThreePointArc((-12.5, 3.551724394), (-12.359177135, 4.259688744), (-11.958147545, 4.859871939))
            Line((-11.958147545, 4.859871939), (-2.25, 14.568019485))
            ThreePointArc((-2.25, 14.568019485), (0, 15.5), (2.25, 14.568019485))
            Line((2.25, 14.568019485), (11.958147545, 4.859871939))
            ThreePointArc((11.958147545, 4.859871939), (12.359177135, 4.259688744), (12.5, 3.551724394))
            Line((12.5, 3.551724394), (12.5, -3.551724394))
            ThreePointArc((12.5, -3.551724394), (12.359177135, -4.259688744), (11.958147545, -4.859871939))
            Line((11.958147545, -4.859871939), (2.25, -14.568019485))
            ThreePointArc((2.25, -14.568019485), (0, -15.5), (-2.25, -14.568019485))
        make_face(mode=Mode.SUBTRACT)
    extrude(amount=BOSS_EXTRUDE1_DEPTH, both=True)


solid = part.part
